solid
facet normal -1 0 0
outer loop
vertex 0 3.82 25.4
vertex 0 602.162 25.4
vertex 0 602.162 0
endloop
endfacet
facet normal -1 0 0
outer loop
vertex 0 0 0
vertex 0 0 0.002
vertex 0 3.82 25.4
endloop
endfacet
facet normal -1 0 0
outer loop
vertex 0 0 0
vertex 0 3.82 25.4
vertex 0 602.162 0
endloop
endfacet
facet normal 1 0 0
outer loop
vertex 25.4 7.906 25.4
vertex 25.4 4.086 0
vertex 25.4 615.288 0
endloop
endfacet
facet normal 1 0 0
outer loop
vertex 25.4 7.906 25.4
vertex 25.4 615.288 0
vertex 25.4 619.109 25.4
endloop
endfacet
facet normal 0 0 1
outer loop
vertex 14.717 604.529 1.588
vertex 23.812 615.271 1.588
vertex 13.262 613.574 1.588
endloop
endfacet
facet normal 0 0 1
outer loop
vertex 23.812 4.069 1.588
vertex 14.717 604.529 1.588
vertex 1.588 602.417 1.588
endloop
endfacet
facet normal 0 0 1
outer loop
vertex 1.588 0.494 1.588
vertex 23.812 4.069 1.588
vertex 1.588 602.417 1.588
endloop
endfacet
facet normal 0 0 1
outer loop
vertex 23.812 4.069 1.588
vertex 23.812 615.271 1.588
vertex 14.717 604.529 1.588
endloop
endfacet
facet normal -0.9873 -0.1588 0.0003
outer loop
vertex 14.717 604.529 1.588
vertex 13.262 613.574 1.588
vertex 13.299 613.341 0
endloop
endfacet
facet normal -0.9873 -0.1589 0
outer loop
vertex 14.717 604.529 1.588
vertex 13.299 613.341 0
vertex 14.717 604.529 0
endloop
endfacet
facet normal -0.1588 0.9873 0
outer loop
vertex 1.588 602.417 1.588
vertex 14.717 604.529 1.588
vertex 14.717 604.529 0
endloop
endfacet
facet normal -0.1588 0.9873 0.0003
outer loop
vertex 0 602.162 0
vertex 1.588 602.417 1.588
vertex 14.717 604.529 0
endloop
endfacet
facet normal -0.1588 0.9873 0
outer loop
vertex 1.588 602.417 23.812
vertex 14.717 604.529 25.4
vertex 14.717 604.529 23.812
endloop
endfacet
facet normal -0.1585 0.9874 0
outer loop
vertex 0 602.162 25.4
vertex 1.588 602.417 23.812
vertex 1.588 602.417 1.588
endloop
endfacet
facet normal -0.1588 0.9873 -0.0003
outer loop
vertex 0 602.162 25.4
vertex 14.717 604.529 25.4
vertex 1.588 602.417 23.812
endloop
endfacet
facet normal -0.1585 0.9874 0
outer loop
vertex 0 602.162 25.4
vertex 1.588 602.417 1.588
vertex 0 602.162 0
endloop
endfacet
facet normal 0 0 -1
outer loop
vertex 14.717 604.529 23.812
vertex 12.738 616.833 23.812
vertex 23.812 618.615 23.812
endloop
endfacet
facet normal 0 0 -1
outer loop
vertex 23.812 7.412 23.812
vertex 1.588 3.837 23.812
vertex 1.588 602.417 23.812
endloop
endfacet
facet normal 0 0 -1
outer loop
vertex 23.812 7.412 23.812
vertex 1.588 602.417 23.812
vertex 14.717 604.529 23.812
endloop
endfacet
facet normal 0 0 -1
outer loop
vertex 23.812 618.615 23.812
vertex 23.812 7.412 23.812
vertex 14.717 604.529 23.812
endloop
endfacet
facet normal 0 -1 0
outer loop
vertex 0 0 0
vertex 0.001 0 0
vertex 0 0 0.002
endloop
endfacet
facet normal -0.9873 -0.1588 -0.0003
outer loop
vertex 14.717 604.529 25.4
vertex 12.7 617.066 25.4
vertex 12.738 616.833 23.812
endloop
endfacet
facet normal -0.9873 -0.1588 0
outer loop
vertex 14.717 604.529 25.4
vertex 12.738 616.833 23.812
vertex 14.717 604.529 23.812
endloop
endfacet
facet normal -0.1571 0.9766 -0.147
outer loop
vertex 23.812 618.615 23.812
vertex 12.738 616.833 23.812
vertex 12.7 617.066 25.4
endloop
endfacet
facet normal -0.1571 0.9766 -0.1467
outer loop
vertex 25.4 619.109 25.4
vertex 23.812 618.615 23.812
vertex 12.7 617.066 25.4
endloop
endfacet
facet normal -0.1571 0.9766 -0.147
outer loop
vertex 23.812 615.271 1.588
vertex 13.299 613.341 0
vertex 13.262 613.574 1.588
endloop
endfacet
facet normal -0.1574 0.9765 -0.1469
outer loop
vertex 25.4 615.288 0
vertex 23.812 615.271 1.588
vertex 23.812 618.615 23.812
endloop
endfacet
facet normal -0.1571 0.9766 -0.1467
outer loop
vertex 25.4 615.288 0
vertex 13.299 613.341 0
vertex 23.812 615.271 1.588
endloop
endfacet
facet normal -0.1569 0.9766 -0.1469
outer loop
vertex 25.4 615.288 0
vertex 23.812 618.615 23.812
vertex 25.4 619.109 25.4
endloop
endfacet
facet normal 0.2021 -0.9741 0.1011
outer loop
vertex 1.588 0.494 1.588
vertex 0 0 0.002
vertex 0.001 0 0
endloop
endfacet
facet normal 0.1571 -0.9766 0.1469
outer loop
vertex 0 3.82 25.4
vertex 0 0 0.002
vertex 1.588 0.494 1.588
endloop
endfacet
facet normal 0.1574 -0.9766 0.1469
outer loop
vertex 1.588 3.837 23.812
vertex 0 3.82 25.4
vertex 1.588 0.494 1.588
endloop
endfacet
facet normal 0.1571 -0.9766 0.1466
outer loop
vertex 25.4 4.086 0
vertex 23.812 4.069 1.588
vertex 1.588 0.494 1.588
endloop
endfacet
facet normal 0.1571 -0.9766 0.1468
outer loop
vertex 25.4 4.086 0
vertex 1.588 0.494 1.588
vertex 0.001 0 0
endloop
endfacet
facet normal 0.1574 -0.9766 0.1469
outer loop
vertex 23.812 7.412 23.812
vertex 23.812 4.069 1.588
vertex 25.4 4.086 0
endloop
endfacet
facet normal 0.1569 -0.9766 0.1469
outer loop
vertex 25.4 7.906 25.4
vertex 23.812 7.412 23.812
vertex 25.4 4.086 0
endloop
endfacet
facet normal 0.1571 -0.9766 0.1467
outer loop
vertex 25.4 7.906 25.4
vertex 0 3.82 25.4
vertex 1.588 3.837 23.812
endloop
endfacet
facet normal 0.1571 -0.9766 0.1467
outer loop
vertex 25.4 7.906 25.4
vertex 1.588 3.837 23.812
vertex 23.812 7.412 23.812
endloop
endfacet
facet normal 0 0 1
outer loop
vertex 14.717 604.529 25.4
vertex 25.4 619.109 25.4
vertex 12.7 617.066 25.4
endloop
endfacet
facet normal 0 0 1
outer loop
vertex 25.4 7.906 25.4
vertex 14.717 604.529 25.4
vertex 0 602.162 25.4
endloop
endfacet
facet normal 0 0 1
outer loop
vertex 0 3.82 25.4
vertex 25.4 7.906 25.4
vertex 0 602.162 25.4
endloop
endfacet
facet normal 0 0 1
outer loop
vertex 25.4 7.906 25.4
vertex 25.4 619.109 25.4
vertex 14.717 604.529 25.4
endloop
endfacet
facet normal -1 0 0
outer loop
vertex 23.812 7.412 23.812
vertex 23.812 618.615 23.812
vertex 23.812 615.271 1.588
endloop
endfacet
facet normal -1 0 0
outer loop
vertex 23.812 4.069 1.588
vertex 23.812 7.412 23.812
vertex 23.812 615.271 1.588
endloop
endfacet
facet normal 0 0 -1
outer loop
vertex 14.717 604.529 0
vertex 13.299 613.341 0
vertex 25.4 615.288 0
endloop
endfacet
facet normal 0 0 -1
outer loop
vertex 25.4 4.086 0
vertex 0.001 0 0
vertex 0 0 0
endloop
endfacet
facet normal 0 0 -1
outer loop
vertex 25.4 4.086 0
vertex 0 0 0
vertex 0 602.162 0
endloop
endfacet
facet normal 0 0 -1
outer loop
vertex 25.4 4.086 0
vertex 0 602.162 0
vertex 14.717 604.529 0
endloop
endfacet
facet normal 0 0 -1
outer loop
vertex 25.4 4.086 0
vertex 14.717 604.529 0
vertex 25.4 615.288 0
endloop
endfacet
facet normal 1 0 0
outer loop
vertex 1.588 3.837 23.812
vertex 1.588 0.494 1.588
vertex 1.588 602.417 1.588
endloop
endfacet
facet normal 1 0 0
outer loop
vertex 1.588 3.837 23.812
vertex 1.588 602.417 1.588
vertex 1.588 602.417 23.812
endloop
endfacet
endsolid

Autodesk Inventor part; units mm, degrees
ref_plane "YZ Plane" through (0, 0, 0) normal (1, 0, 0) x (0, 1, 0)
ref_plane "XZ Plane" through (0, 0, 0) normal (0, 1, 0) x (-1, 0, 0)
ref_plane "XY Plane" through (0, 0, 0) normal (0, 0, 1) x (1, 0, 0)
sketch "Sketch1" plane through (0, 0, 0) normal (0, 1, 0) x (-1, 0, 0)
  line L0 (0, 0) -> (-25.4, 0)
  line L1 (-25.4, 0) -> (-25.4, 25.4)
  line L2 (-25.4, 25.4) -> (0, 25.4)
  line L3 (0, 25.4) -> (0, 0)
  line L4 (-1.5875, 23.8125) -> (-23.8125, 23.8125)
  line L5 (-23.8125, 23.8125) -> (-23.8125, 1.5875)
  line L6 (-23.8125, 1.5875) -> (-1.5875, 1.5875)
  line L7 (-1.5875, 1.5875) -> (-1.5875, 23.8125)
  dimension "d0" = 25.4
  dimension "d2" = 25.4
  dimension "d3" = 1.5875
extrude "Extrusion1" add sketch "Sketch1" along normal blind 1016
ref_plane "Work Plane1" through (102.0769, 3.5287, 0.7496) normal (0.0123, -0.1468, -0.9891) x (-0.1571, 0.9766, -0.1469)
sketch "Sketch4" plane through (102.0769, 3.5287, 0.7496) normal (0.0123, -0.1468, -0.9891) x (-0.1571, 0.9766, -0.1469)
  line L0 (12.7, -101.348) -> (12.7, -75.0726)
  line L1 (12.7, -75.0726) -> (-1.1984, -75.0726)
  line L2 (-1.1984, -75.0726) -> (-1.1984, -113.5605)
  line L3 (-1.1984, -113.5605) -> (12.7, -101.348)
extrude "Extrusion3" cut sketch "Sketch4" along normal mid plane 2540
ref_plane "Work Plane2" through (2.7066, 641.7405, 200.1131) normal (-0.1571, 0.9766, -0.1469) x (0.9875, 0.1572, -0.011)
sketch "Sketch5" plane through (2.7066, 641.7405, 200.1131) normal (-0.1571, 0.9766, -0.1469) x (0.9875, 0.1572, -0.011)
  line L0 (-64.0002, -43.7034) -> (-64.0002, 400.9318)
  line L1 (-64.0002, 400.9318) -> (260.4368, 400.9318)
  line L2 (260.4368, 400.9318) -> (260.4368, -43.7034)
  line L3 (260.4368, -43.7034) -> (-64.0002, -43.7034)
  point P0 (-101.348, 292.1)
extrude "Extrusion4" cut sketch "Sketch5" along normal blind 2540
sketch "Sketch6" plane through (0, 3.8207, 25.4) normal (0, 0, 1) x (1, 0, 0)
  line L0 (25.4, 615.2901) -> (0, 611.2042) projected
  line L1 (0, 0) -> (0, 611.2042) projected
  line L2 (0, 0) -> (25.4, 4.0859) projected
  line L3 (12.7, 613.2471) -> (14.717, 600.7083)
  line L4 (14.717, 600.7083) -> (0, 598.3409)
  point P0 (0, -3.8207)
  dimension "d12" = 12.7
extrude "Extrusion5" cut sketch "Sketch6" against normal blind 25.4
properties part number "Square Tube 4"
